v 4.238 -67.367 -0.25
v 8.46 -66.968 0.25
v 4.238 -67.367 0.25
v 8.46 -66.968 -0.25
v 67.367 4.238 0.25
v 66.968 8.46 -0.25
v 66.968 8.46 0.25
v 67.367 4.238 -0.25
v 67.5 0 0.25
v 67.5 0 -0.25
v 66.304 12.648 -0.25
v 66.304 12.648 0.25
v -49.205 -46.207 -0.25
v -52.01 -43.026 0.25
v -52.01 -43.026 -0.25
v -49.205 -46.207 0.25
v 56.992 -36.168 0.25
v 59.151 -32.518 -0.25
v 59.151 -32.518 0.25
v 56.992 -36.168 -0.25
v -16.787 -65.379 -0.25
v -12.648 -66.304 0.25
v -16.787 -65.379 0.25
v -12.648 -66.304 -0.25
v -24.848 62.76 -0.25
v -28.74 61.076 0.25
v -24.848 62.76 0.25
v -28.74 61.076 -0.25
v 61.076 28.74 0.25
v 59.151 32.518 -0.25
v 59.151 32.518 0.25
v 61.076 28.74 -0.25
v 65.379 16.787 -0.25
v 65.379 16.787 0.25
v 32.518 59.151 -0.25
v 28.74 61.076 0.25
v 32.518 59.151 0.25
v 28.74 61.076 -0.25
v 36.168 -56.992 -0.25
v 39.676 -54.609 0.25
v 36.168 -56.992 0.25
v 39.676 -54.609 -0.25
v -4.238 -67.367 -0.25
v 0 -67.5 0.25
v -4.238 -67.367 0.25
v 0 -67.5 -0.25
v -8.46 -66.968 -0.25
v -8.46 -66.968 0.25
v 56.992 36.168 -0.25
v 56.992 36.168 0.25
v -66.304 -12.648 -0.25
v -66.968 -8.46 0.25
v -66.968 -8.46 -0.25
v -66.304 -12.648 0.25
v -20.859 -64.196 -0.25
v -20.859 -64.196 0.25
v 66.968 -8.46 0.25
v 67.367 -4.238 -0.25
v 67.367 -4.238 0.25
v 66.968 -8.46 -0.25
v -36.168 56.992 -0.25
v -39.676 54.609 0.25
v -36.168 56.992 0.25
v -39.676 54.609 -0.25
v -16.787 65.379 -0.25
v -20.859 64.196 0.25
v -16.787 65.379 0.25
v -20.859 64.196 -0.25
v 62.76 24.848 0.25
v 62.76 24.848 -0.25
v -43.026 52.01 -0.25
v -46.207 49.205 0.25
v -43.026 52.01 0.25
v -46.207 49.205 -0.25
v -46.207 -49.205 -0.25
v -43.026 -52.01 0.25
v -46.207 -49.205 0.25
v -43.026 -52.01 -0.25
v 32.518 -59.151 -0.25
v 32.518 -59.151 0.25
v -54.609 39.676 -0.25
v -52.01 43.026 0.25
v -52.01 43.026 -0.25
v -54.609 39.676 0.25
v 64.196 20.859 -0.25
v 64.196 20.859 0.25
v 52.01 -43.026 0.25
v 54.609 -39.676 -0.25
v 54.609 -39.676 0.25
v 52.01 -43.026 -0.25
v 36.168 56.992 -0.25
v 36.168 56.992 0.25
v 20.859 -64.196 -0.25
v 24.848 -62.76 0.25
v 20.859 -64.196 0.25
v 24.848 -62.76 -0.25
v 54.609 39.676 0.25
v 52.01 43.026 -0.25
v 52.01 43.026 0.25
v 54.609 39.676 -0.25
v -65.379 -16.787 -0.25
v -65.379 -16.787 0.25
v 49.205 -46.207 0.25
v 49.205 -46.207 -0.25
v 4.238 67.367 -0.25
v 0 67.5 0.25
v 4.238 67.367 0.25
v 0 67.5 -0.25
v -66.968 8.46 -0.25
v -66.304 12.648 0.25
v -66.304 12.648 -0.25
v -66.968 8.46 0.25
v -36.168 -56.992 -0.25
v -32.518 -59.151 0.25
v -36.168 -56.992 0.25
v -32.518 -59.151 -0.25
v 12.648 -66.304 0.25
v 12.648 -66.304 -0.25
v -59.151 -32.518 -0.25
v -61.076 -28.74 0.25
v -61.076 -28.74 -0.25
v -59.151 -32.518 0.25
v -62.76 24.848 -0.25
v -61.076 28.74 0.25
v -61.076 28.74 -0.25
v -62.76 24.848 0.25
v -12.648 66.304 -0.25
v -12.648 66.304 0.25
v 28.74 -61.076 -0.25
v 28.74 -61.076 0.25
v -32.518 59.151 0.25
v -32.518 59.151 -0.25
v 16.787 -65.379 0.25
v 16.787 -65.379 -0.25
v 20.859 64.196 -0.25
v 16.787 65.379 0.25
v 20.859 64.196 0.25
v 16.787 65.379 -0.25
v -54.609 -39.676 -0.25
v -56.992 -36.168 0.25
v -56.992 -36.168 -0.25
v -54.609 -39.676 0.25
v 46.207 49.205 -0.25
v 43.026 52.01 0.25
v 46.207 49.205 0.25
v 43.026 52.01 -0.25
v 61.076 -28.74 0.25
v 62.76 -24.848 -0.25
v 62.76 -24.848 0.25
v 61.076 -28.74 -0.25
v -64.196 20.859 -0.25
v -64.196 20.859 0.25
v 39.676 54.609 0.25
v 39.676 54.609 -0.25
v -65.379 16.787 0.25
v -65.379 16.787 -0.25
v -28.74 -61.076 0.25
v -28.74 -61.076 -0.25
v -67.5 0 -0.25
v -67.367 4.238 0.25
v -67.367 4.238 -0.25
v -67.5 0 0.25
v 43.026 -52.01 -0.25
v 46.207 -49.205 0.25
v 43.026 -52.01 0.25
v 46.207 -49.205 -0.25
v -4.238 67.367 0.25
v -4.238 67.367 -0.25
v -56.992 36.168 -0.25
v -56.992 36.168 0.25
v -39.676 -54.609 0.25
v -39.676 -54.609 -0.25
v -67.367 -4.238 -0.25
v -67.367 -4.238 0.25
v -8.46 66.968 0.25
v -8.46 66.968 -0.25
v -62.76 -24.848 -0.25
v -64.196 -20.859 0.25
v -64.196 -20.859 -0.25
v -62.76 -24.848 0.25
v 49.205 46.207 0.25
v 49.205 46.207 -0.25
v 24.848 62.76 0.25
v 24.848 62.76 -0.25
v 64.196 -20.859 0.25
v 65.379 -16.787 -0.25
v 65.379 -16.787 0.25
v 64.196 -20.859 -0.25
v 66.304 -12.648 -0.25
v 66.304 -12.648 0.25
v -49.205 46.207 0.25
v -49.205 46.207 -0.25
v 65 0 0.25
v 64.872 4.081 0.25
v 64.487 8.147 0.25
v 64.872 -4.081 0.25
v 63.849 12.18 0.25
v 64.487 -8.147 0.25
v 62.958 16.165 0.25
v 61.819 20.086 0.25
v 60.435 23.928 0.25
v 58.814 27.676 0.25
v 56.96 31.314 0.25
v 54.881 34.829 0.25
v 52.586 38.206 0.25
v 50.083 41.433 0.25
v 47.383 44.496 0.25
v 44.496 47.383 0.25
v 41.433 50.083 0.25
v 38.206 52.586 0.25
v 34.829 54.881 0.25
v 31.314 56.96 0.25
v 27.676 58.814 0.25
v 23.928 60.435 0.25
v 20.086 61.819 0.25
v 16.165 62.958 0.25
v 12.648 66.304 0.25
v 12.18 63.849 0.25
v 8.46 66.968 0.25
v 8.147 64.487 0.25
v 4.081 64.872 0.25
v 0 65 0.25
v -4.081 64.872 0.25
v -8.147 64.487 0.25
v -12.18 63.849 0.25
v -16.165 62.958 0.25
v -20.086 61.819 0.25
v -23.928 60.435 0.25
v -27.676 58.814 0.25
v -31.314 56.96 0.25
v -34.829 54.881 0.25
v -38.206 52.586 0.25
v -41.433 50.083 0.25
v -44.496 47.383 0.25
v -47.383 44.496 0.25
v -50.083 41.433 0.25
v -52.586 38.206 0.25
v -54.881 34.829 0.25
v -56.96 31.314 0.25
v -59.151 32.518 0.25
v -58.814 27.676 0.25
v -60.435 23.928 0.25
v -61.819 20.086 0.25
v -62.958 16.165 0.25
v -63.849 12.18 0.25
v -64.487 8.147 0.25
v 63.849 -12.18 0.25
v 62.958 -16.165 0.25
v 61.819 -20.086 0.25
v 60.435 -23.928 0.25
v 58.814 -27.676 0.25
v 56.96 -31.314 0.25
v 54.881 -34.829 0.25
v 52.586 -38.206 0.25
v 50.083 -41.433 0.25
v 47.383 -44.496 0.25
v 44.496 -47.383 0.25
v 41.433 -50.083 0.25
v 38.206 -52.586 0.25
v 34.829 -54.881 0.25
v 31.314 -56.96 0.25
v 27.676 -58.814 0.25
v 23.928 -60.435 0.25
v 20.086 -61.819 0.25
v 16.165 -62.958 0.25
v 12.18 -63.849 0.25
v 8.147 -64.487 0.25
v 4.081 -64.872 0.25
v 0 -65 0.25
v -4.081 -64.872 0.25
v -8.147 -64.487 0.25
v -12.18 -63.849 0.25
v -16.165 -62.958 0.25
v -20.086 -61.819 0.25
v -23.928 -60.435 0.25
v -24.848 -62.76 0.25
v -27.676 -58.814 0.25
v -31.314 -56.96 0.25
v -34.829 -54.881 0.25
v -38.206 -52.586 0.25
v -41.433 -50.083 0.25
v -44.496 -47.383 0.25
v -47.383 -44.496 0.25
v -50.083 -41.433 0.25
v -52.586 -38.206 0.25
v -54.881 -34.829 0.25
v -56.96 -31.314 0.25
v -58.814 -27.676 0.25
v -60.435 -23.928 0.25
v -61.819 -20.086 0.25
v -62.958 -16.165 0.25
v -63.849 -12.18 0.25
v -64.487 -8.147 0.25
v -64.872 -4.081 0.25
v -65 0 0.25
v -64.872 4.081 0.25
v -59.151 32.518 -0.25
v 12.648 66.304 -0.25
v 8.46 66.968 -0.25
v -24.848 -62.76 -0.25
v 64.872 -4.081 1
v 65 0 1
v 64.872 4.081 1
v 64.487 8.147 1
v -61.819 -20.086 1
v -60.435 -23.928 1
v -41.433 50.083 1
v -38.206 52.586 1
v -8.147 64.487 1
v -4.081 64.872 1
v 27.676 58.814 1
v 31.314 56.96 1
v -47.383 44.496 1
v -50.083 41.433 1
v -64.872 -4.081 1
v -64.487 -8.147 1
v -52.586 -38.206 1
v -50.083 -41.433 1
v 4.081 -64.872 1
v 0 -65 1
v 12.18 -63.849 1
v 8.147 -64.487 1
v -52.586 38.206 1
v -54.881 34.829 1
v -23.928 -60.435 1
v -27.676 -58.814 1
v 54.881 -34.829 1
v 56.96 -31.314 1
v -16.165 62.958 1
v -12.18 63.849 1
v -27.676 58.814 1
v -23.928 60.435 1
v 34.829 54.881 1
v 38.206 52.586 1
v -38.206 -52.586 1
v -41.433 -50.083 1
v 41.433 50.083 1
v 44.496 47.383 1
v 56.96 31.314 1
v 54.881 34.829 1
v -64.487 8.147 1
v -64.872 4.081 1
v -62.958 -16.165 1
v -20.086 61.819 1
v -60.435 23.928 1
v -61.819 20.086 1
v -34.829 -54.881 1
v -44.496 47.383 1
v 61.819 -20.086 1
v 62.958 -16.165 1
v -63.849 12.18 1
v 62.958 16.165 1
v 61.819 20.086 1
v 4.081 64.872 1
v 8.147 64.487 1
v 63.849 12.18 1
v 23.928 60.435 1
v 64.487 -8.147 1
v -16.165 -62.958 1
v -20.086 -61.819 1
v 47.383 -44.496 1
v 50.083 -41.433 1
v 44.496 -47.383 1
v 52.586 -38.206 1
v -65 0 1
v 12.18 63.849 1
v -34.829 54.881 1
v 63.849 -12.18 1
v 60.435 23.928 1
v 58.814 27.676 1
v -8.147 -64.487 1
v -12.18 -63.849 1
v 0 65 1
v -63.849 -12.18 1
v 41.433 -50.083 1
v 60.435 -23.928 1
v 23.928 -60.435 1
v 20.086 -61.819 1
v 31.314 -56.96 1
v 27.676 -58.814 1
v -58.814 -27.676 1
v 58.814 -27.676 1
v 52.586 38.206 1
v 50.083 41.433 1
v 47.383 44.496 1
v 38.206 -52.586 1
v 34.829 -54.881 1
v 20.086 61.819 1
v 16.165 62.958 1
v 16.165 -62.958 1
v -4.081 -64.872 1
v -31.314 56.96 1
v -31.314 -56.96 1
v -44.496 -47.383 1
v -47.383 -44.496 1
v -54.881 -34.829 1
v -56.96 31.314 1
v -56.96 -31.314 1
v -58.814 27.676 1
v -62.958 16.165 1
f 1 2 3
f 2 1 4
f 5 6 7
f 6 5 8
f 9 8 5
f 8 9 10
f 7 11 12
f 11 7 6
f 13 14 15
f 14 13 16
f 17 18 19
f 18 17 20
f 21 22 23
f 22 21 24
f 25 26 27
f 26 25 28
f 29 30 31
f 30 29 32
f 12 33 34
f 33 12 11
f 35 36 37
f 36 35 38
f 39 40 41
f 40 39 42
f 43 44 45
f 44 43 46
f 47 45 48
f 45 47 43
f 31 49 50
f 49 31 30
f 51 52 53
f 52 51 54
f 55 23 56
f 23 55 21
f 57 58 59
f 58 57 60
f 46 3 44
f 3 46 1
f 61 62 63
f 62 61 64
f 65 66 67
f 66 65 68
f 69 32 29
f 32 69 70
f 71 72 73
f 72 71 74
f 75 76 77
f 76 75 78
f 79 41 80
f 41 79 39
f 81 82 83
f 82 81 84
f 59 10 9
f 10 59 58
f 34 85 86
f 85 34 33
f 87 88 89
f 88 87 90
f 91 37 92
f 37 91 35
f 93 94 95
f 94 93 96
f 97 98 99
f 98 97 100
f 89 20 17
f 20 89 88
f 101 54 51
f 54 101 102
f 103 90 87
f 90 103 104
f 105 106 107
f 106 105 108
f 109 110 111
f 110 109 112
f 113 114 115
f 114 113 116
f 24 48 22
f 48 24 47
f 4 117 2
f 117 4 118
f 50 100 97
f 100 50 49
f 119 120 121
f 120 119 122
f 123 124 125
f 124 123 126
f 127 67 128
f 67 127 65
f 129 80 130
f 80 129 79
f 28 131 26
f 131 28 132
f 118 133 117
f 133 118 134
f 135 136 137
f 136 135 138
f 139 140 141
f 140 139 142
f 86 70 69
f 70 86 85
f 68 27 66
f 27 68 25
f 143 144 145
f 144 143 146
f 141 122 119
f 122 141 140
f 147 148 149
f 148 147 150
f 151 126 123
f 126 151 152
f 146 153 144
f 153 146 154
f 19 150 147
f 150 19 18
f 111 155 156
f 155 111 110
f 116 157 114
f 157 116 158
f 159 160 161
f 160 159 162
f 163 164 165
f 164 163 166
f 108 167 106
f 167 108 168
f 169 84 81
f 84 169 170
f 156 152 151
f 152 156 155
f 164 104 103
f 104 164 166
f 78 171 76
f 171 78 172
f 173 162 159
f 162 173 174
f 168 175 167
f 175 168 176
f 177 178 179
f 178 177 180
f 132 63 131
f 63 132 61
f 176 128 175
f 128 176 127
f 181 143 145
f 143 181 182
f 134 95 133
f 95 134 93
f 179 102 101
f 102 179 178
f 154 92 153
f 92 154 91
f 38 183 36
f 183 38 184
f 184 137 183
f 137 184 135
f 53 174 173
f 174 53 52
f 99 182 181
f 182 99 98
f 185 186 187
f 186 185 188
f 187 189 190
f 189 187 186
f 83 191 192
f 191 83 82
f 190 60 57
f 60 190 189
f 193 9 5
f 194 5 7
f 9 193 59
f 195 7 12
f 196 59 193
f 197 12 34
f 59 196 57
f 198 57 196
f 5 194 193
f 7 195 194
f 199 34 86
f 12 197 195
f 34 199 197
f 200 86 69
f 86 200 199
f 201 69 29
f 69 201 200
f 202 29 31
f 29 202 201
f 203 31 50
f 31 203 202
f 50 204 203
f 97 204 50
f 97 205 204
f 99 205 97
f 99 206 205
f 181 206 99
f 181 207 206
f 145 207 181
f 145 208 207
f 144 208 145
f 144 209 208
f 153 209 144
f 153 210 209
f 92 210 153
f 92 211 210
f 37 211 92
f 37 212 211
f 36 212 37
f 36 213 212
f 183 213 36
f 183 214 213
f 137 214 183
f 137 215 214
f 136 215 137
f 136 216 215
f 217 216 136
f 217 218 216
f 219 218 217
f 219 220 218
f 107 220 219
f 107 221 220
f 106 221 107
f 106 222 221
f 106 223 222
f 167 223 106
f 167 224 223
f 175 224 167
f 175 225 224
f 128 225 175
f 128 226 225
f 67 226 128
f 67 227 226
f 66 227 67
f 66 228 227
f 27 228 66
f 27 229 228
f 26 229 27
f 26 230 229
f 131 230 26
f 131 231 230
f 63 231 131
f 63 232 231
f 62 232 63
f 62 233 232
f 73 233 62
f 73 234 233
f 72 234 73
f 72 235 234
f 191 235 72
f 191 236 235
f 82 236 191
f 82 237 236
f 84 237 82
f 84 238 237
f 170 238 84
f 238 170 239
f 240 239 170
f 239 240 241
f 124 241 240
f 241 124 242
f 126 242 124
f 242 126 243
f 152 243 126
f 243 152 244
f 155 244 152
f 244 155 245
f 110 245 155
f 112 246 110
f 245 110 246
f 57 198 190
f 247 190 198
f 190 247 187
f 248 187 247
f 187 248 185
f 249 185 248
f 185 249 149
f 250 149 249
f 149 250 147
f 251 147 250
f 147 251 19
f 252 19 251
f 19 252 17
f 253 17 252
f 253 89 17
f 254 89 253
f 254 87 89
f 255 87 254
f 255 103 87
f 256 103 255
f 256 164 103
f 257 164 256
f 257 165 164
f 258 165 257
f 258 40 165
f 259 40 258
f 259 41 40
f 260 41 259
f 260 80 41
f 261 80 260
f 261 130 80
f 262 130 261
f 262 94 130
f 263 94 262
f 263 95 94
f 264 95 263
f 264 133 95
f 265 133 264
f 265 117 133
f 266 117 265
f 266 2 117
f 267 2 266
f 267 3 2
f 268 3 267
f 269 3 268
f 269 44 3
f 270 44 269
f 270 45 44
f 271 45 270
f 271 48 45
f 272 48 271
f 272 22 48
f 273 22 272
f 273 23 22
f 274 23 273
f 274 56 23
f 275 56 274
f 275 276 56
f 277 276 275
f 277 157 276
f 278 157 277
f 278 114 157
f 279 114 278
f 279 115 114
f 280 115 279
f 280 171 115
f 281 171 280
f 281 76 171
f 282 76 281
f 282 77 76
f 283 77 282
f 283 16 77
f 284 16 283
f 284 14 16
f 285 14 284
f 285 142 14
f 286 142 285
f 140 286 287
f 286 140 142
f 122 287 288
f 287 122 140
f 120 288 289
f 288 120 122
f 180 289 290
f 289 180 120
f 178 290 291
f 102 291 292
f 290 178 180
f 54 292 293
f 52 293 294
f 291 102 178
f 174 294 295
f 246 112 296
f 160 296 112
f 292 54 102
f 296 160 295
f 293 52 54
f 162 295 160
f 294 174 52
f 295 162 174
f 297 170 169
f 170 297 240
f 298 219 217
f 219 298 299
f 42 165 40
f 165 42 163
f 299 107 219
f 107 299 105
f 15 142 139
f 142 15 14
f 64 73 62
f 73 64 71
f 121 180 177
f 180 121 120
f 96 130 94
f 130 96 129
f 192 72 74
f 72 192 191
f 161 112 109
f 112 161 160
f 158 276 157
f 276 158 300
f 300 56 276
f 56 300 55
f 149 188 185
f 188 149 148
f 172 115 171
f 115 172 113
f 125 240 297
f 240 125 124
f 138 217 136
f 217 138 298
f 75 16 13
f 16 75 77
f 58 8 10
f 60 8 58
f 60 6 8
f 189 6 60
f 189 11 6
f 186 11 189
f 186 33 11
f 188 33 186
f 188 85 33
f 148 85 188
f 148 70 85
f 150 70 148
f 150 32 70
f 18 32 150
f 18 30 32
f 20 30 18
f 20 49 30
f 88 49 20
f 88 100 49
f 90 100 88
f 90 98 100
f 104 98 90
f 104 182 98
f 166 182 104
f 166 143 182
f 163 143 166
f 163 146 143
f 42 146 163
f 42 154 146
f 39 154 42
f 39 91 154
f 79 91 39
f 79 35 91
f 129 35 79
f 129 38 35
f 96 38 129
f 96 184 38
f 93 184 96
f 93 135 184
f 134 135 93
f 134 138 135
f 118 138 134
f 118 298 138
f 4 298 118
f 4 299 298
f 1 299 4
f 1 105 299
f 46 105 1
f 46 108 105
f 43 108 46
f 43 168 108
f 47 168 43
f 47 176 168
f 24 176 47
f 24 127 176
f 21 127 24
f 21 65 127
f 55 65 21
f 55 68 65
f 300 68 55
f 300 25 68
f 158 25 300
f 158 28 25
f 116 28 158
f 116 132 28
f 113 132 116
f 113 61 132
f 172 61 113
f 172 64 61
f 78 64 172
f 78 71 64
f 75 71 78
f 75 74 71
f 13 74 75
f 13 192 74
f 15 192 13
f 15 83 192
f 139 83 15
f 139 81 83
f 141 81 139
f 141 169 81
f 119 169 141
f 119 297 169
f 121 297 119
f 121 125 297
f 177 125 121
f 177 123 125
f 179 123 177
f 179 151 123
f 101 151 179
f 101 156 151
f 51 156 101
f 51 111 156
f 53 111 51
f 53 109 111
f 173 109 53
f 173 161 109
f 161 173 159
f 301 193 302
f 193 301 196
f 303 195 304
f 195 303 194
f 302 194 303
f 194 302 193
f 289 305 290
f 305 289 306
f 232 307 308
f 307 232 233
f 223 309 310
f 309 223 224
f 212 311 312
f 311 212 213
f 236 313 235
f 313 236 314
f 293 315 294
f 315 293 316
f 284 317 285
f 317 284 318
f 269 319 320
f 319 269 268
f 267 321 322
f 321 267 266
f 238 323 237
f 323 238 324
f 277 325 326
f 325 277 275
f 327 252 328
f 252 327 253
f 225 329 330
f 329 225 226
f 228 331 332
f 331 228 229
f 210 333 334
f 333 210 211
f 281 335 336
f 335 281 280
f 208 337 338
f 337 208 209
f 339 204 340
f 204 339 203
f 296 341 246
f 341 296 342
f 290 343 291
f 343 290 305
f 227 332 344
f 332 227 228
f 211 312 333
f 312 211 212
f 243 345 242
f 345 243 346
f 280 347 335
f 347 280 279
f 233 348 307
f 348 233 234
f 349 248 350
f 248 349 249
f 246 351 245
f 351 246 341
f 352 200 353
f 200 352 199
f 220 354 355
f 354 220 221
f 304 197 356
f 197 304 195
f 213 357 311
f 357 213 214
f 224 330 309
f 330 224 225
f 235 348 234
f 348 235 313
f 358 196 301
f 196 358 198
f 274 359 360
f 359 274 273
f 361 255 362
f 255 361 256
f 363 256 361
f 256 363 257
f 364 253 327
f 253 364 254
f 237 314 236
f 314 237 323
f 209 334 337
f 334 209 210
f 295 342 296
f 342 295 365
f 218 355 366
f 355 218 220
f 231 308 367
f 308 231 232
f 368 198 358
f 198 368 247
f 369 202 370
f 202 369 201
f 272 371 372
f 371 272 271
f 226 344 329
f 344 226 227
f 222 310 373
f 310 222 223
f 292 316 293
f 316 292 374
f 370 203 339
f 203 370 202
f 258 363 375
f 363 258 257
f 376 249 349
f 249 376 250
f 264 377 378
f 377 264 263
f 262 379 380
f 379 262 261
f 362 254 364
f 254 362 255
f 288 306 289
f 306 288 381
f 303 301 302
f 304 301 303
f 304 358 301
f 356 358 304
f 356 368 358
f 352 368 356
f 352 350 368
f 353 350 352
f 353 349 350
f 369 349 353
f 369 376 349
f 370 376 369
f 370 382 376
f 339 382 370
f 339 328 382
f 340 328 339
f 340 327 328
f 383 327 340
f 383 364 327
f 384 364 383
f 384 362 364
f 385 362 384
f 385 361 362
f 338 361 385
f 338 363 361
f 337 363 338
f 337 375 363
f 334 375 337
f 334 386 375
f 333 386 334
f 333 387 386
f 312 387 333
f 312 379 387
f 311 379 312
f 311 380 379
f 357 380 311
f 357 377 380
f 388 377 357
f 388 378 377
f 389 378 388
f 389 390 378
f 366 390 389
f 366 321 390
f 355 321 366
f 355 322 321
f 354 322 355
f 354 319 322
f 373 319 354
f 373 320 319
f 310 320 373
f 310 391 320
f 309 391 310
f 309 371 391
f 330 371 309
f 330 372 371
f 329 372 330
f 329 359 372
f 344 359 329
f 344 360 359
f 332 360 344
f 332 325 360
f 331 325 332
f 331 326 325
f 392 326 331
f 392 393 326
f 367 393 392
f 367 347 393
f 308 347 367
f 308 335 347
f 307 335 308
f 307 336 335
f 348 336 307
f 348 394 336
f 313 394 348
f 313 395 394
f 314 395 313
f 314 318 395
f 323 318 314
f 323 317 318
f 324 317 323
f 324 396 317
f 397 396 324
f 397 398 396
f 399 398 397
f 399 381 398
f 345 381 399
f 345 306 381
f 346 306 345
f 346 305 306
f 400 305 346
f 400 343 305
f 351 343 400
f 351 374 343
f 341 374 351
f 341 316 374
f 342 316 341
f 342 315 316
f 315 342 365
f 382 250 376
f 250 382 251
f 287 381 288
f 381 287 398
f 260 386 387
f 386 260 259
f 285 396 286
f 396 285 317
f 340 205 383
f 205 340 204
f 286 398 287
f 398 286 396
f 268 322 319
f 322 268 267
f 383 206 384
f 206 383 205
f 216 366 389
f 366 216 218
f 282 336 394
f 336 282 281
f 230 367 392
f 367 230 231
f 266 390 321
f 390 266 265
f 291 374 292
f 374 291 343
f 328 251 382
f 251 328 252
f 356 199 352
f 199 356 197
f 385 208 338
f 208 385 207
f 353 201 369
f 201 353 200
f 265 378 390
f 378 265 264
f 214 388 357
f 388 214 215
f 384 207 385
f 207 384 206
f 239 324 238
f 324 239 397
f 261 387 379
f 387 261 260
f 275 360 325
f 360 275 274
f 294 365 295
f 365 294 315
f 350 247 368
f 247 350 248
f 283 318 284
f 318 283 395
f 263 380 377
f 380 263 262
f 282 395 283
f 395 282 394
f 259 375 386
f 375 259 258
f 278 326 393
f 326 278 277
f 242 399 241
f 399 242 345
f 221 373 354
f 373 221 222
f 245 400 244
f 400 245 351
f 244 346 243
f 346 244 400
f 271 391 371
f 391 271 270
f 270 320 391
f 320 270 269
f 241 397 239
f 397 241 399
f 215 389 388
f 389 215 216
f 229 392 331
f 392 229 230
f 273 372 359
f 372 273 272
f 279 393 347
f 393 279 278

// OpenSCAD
//Parametric Light Lens for a recessed overhead light

// Large diameter
d=135; 
// lip width
l=5;
//height
h=1;

$fn=100;

union(){
cylinder(r=d/2, h=h/2, center=true);
translate([0,0,h/2])cylinder(r=(d-l)/2, h=h, center=true);
}
